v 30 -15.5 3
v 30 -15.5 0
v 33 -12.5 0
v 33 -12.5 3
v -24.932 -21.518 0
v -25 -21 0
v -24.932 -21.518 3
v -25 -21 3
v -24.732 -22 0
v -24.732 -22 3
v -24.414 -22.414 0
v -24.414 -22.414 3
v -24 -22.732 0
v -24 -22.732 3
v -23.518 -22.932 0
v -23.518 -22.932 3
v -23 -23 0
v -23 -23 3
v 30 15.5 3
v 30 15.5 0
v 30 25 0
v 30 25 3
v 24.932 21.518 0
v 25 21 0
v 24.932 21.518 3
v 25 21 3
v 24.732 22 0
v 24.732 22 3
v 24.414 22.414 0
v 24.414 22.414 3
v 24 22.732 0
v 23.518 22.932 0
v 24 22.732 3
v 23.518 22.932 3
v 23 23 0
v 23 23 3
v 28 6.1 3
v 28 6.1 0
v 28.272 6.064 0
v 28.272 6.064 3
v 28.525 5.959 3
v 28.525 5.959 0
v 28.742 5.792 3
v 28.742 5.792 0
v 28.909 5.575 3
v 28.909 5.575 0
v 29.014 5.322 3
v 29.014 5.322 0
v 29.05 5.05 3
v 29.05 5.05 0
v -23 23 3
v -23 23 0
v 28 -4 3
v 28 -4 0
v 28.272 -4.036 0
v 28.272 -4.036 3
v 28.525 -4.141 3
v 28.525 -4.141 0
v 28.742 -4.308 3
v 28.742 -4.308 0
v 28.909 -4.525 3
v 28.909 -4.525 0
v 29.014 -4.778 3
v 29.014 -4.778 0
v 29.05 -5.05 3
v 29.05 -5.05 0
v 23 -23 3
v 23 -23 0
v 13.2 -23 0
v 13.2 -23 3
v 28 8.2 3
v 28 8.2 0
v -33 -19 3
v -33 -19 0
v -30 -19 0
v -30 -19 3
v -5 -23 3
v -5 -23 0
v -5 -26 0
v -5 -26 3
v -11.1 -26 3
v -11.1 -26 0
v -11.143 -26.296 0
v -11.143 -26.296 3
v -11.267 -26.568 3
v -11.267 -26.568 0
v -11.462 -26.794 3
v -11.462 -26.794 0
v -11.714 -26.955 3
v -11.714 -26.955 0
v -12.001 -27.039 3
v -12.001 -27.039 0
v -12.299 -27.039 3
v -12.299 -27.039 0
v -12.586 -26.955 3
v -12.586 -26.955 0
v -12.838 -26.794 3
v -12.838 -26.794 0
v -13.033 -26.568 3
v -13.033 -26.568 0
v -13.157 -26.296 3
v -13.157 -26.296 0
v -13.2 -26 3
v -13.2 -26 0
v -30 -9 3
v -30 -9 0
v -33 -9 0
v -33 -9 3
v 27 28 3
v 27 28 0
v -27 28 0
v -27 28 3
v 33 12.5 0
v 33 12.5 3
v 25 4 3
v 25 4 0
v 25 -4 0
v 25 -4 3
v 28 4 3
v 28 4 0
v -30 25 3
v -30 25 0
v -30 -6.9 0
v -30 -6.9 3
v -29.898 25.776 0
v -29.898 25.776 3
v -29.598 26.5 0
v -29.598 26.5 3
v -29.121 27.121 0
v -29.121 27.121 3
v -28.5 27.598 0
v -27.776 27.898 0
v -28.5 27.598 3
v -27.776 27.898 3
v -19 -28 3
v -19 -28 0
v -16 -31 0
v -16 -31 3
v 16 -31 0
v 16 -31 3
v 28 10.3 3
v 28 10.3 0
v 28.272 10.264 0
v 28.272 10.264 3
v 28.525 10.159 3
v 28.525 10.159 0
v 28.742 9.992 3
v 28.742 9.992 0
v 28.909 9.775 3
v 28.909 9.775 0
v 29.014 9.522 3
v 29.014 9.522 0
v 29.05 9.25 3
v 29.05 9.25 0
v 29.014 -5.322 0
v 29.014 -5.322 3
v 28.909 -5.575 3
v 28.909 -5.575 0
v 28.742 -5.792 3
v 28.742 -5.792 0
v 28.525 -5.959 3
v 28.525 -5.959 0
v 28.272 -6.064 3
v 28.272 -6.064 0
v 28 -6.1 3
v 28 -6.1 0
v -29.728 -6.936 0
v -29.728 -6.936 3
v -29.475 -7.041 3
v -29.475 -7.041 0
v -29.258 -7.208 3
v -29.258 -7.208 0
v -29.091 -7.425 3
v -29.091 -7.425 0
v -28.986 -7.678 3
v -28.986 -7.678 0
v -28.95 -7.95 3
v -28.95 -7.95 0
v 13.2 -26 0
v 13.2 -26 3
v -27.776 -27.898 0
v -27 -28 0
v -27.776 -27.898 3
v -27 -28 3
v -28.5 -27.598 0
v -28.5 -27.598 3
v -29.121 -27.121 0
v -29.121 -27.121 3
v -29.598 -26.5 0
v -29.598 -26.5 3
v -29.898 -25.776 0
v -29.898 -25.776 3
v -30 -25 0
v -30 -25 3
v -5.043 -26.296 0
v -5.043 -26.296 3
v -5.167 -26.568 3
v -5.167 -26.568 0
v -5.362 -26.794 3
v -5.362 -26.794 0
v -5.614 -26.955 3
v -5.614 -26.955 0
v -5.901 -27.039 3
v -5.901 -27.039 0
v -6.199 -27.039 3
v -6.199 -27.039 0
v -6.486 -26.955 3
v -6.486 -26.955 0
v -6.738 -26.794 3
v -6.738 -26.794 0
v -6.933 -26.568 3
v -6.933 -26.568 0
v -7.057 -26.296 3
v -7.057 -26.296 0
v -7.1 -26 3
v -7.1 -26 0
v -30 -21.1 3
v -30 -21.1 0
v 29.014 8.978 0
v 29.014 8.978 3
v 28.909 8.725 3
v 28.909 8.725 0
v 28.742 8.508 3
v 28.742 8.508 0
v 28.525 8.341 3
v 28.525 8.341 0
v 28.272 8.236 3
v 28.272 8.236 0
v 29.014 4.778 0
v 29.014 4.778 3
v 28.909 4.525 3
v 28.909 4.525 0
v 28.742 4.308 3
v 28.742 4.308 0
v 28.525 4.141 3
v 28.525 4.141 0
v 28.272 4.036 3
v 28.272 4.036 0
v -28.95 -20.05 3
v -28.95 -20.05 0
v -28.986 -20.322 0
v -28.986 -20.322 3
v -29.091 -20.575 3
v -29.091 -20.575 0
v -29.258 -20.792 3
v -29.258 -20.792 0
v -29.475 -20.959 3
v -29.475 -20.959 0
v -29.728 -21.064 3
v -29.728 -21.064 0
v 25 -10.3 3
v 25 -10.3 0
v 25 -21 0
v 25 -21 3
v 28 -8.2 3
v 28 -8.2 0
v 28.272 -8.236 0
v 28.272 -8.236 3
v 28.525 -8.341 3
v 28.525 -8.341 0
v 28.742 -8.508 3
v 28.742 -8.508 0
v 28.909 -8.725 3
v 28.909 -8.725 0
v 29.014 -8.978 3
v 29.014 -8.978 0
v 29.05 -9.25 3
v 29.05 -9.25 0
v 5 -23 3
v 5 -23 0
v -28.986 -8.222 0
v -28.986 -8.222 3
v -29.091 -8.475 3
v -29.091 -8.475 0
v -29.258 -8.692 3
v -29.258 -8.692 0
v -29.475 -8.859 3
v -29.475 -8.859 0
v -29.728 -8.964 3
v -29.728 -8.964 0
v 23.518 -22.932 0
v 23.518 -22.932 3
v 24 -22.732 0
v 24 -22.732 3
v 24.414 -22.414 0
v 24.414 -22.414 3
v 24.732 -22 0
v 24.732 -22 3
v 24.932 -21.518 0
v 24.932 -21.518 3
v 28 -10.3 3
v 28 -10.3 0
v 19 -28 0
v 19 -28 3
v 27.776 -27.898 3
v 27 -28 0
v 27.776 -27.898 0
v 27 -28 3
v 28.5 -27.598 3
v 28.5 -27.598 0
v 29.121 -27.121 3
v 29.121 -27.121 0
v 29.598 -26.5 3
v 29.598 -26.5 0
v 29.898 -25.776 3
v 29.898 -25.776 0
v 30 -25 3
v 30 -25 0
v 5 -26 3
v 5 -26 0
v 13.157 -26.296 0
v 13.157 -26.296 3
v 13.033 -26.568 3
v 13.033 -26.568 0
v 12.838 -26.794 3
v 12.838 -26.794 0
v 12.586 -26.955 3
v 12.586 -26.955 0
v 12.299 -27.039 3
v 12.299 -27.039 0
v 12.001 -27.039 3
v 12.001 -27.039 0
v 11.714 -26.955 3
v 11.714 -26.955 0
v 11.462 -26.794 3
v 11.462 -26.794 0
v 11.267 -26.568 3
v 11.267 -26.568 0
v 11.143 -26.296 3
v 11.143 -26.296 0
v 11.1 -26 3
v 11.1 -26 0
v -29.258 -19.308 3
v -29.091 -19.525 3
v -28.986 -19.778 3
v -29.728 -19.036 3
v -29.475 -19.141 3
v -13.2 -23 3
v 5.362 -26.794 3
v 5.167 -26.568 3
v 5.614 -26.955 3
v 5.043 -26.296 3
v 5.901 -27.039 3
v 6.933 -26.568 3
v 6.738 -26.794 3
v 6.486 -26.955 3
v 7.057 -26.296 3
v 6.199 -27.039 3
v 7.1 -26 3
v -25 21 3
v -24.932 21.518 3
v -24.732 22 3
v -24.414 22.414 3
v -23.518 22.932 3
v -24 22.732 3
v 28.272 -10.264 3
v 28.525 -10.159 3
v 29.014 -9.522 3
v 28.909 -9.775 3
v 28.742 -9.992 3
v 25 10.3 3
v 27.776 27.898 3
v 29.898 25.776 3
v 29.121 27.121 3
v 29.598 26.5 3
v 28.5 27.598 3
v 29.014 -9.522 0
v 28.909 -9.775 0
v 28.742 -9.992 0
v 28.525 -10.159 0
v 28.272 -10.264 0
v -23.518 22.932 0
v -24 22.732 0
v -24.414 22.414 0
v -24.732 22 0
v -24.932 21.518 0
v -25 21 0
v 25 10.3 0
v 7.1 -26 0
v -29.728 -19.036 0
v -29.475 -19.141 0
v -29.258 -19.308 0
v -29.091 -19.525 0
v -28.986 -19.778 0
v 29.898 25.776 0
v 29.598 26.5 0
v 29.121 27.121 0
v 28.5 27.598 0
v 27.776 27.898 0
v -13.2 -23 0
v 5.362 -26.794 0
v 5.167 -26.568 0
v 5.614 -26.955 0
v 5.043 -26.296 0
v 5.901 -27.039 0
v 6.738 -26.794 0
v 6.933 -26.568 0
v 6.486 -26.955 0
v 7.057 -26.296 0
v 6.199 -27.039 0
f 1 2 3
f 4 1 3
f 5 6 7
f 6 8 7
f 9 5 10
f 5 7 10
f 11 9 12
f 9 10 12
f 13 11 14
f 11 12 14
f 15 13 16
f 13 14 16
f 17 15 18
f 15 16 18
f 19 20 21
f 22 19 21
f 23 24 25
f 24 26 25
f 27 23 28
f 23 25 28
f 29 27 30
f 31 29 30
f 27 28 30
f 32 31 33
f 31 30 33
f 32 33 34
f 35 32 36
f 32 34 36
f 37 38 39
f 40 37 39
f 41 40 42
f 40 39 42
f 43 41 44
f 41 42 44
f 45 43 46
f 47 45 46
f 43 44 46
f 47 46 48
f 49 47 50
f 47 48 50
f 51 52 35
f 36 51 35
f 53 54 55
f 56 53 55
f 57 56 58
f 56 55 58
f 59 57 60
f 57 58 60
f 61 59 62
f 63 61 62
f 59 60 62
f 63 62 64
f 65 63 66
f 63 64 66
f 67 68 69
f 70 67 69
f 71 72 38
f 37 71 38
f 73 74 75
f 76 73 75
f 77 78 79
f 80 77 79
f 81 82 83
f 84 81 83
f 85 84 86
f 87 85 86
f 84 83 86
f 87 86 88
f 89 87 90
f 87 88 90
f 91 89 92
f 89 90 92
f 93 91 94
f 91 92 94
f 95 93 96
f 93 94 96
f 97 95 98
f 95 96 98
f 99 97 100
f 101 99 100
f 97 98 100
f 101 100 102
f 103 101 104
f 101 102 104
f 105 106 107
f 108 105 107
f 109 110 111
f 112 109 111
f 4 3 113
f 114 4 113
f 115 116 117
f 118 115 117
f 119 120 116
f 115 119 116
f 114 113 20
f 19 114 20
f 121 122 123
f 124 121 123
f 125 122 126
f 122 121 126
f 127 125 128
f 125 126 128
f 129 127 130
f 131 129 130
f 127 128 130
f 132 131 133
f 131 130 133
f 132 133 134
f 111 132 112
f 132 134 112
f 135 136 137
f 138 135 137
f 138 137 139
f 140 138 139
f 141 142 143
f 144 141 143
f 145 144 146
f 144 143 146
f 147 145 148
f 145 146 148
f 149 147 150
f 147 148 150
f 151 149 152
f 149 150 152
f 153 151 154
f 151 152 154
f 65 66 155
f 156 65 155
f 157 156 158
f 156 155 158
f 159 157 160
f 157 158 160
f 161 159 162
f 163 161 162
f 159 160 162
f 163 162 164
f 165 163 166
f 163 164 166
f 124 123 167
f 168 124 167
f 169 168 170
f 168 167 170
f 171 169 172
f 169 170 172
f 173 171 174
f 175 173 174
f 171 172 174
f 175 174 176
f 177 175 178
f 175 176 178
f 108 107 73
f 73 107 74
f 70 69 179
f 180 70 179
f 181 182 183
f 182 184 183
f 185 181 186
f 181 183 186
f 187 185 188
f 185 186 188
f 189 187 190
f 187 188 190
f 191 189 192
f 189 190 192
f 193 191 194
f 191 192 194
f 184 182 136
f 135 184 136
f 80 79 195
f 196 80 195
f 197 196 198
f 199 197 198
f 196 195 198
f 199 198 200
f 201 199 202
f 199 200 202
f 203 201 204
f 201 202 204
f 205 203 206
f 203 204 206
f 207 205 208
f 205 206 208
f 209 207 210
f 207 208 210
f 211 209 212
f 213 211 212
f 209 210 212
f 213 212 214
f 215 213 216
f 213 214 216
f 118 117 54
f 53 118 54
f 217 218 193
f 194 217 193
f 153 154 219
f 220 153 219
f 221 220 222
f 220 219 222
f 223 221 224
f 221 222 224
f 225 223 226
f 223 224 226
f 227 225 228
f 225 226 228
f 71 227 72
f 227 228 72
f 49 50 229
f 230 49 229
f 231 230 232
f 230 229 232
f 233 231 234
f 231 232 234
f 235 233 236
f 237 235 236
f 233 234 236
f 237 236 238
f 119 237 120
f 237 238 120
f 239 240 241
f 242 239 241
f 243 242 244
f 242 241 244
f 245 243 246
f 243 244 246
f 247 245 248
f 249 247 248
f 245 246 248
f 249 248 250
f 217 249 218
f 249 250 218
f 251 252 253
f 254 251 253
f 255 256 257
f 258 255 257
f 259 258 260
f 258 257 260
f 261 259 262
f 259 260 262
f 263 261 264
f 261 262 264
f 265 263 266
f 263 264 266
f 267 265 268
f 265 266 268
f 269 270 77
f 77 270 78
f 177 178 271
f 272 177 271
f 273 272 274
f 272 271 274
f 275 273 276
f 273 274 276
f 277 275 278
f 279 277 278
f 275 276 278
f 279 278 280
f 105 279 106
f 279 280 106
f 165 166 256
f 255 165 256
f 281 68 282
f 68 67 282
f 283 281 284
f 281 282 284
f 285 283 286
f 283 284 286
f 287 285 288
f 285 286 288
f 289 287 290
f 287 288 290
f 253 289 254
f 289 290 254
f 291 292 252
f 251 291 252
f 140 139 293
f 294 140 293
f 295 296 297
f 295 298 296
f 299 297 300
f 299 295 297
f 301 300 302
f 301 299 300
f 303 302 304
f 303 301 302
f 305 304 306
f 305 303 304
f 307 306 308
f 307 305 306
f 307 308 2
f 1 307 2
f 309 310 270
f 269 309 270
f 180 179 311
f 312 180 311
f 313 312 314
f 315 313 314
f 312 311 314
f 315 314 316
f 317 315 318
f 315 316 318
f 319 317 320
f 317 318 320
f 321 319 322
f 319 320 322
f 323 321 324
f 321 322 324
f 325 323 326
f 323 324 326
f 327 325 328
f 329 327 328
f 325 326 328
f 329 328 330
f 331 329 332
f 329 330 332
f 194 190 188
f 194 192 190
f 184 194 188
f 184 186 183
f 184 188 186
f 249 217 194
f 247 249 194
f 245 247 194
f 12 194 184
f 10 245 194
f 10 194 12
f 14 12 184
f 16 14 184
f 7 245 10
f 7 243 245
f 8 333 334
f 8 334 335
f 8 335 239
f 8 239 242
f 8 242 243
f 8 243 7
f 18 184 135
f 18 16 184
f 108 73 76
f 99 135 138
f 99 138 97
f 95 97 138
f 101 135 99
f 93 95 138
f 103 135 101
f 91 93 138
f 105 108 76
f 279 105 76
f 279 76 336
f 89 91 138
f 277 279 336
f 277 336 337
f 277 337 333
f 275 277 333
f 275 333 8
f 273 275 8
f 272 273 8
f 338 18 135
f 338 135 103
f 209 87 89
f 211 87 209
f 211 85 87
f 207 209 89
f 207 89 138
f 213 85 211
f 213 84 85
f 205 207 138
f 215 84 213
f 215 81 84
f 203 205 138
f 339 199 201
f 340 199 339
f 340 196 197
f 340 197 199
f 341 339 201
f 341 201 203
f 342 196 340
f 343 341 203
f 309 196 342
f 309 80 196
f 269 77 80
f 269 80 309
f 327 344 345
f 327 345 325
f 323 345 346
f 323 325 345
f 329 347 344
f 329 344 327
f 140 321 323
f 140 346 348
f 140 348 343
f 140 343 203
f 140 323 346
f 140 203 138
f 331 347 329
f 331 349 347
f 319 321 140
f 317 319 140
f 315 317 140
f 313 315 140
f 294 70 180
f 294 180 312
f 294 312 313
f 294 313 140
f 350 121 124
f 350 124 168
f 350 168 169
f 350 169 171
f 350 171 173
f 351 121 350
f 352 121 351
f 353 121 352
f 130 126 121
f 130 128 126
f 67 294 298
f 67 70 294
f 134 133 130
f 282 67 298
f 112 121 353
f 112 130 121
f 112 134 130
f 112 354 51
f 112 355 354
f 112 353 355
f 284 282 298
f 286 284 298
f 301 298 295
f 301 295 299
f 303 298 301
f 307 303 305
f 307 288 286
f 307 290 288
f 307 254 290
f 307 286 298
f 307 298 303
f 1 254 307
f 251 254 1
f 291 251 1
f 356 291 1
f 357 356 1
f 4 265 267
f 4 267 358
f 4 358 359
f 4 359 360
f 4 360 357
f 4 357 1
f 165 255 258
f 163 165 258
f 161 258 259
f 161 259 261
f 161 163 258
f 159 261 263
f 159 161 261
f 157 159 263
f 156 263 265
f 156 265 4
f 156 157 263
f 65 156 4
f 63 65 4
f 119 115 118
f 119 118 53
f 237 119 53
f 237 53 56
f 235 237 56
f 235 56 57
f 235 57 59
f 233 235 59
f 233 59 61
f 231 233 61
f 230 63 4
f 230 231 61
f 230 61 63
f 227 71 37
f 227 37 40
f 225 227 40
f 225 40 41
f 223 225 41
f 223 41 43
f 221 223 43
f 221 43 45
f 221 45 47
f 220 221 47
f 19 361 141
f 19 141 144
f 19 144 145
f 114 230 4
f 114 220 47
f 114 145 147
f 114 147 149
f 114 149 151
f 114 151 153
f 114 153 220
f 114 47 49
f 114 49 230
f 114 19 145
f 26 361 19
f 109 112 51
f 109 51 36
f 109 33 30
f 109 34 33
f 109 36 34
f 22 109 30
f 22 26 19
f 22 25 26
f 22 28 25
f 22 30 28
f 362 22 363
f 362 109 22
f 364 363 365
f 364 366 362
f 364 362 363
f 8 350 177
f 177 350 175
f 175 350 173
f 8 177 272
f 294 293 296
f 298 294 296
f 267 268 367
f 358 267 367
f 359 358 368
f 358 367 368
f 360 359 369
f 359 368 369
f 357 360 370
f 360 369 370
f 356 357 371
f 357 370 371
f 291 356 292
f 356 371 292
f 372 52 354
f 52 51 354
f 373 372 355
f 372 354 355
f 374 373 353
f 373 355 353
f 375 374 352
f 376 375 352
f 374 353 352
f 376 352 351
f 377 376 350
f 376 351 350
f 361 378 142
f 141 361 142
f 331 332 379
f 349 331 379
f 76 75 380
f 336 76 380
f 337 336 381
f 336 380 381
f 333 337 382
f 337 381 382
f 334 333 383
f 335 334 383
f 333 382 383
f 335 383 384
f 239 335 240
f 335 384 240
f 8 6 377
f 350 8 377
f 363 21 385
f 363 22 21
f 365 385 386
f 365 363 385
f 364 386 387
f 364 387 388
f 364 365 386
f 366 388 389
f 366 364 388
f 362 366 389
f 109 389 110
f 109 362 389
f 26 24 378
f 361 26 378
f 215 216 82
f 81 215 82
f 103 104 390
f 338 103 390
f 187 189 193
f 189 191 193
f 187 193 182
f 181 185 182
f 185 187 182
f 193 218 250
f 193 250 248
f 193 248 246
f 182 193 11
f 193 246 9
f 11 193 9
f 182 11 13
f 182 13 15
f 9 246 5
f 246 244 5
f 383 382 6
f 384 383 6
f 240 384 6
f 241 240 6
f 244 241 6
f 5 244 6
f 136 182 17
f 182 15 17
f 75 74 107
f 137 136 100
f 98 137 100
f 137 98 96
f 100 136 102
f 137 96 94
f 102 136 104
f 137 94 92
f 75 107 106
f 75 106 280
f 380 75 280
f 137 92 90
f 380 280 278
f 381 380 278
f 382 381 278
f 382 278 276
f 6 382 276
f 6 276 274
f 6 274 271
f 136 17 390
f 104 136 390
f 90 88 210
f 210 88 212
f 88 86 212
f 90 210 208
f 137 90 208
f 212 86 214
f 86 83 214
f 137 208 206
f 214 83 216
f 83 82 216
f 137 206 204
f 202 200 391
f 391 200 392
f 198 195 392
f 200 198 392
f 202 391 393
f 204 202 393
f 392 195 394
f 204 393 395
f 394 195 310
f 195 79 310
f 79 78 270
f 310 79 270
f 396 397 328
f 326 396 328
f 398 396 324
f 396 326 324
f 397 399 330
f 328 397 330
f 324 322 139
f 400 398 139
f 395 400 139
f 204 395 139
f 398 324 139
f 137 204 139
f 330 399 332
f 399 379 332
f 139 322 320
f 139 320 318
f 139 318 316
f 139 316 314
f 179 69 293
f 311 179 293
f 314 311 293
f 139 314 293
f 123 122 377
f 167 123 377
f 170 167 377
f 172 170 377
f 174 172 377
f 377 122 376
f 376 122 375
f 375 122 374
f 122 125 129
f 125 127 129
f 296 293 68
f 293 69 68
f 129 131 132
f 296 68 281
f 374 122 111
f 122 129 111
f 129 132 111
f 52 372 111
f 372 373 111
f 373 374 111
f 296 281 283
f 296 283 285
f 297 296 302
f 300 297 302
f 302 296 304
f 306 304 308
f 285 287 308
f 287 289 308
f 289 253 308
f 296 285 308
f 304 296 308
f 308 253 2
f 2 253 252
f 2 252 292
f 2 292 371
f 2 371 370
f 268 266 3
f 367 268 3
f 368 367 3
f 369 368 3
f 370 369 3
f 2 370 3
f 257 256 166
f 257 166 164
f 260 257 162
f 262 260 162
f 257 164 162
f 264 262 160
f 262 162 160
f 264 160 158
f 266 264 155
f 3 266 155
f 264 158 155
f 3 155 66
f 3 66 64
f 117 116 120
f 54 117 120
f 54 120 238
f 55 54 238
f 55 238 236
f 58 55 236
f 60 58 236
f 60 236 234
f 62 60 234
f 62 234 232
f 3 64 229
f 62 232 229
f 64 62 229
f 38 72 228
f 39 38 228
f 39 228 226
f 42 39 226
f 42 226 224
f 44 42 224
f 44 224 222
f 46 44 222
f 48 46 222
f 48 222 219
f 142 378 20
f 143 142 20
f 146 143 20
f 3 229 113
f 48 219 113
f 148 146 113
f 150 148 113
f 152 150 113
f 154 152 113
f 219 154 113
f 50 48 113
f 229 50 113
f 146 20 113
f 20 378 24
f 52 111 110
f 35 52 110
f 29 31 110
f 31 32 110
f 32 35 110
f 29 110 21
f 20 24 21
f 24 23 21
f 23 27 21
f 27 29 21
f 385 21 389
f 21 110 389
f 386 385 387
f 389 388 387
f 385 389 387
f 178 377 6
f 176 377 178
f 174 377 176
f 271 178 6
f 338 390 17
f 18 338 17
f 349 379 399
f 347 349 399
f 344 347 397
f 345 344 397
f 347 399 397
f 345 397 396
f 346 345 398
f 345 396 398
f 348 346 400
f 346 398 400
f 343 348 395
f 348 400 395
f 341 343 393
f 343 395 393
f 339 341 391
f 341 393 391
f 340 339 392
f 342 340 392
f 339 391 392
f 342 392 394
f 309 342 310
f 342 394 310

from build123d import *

# Parameters (mm, degrees)
EXTRUDE_1_DEPTH = 3
FILLET_1_R      = 3
FILLET_2_R      = 2


with BuildPart() as part:
    # 草图1 → 凸台-拉伸1 (new body)
    with BuildSketch(Plane.XY):
        with BuildLine():
            Line((-30, -23), (-30, -28))
            Line((-30, -28), (-19, -28))
            Line((-19, -28), (-16, -31))
            Line((-16, -31), (16, -31))
            Line((16, -31), (19, -28))
            Line((19, -28), (30, -28))
            Line((30, -28), (30, -23))
            Line((30, -23), (30, -18))
            Line((30, -18), (30, -15.5))
            Line((30, -15.5), (33, -12.5))
            Line((33, -12.5), (33, 12.5))
            Line((33, 12.5), (30, 15.5))
            Line((30, 15.5), (30, 28))
            Line((30, 28), (-30, 28))
            Line((-30, 28), (-30, -6.9))
            ThreePointArc((-30, -6.9), (-29.25753788, -7.20753788), (-28.95, -7.95))
            ThreePointArc((-28.95, -7.95), (-29.25753788, -8.69246212), (-30, -9))
            Line((-30, -9), (-33, -9))
            Line((-33, -9), (-33, -19))
            Line((-33, -19), (-30, -19))
            ThreePointArc((-30, -19), (-29.25753788, -19.30753788), (-28.95, -20.05))
            ThreePointArc((-28.95, -20.05), (-29.25753788, -20.79246212), (-30, -21.1))
            Line((-30, -21.1), (-30, -23))
        make_face()
        with BuildLine():
            Line((25, -10.3), (25, -23))
            Line((25, -23), (13.2, -23))
            Line((13.2, -23), (13.2, -26))
            ThreePointArc((13.2, -26), (12.15, -27.05), (11.1, -26))
            Line((11.1, -26), (7.1, -26))
            ThreePointArc((7.1, -26), (6.05, -27.05), (5, -26))
            Line((5, -26), (5, -23))
            Line((5, -23), (-5, -23))
            Line((-5, -23), (-5, -26))
            ThreePointArc((-5, -26), (-6.05, -27.05), (-7.1, -26))
            Line((-7.1, -26), (-11.1, -26))
            ThreePointArc((-11.1, -26), (-12.15, -27.05), (-13.2, -26))
            Line((-13.2, -26), (-13.2, -23))
            Line((-13.2, -23), (-25, -23))
            Line((-25, -23), (-25, 23))
            Line((-25, 23), (25, 23))
            Line((25, 23), (25, 10.3))
            Line((25, 10.3), (28, 10.3))
            ThreePointArc((28, 10.3), (28.74246212, 9.99246212), (29.05, 9.25))
            ThreePointArc((29.05, 9.25), (28.74246212, 8.50753788), (28, 8.2))
            Line((28, 8.2), (28, 6.1))
            ThreePointArc((28, 6.1), (28.74246212, 5.79246212), (29.05, 5.05))
            ThreePointArc((29.05, 5.05), (28.74246212, 4.30753788), (28, 4))
            Line((28, 4), (25, 4))
            Line((25, 4), (25, -4))
            Line((25, -4), (28, -4))
            ThreePointArc((28, -4), (28.74246212, -4.30753788), (29.05, -5.05))
            ThreePointArc((29.05, -5.05), (28.74246212, -5.79246212), (28, -6.1))
            Line((28, -6.1), (28, -8.2))
            ThreePointArc((28, -8.2), (28.74246212, -8.50753788), (29.05, -9.25))
            ThreePointArc((29.05, -9.25), (28.74246212, -9.99246212), (28, -10.3))
            Line((28, -10.3), (25, -10.3))
        make_face(mode=Mode.SUBTRACT)
    extrude(amount=EXTRUDE_1_DEPTH)

    # 圆角1
    fillet_1_edges = [part.edges().sort_by_distance(p)[0] for p in [
        (-30, 28, 1.5),
        (30, 28, 1.5),
        (30, -28, 1.5),
        (-30, -28, 1.5),
    ]]
    fillet(fillet_1_edges, radius=FILLET_1_R)

    # 圆角2
    fillet_2_edges = [part.edges().sort_by_distance(p)[0] for p in [
        (25, 23, 1.5),
        (-25, 23, 1.5),
        (-25, -23, 1.5),
        (25, -23, 1.5),
    ]]
    fillet(fillet_2_edges, radius=FILLET_2_R)


solid = part.part
